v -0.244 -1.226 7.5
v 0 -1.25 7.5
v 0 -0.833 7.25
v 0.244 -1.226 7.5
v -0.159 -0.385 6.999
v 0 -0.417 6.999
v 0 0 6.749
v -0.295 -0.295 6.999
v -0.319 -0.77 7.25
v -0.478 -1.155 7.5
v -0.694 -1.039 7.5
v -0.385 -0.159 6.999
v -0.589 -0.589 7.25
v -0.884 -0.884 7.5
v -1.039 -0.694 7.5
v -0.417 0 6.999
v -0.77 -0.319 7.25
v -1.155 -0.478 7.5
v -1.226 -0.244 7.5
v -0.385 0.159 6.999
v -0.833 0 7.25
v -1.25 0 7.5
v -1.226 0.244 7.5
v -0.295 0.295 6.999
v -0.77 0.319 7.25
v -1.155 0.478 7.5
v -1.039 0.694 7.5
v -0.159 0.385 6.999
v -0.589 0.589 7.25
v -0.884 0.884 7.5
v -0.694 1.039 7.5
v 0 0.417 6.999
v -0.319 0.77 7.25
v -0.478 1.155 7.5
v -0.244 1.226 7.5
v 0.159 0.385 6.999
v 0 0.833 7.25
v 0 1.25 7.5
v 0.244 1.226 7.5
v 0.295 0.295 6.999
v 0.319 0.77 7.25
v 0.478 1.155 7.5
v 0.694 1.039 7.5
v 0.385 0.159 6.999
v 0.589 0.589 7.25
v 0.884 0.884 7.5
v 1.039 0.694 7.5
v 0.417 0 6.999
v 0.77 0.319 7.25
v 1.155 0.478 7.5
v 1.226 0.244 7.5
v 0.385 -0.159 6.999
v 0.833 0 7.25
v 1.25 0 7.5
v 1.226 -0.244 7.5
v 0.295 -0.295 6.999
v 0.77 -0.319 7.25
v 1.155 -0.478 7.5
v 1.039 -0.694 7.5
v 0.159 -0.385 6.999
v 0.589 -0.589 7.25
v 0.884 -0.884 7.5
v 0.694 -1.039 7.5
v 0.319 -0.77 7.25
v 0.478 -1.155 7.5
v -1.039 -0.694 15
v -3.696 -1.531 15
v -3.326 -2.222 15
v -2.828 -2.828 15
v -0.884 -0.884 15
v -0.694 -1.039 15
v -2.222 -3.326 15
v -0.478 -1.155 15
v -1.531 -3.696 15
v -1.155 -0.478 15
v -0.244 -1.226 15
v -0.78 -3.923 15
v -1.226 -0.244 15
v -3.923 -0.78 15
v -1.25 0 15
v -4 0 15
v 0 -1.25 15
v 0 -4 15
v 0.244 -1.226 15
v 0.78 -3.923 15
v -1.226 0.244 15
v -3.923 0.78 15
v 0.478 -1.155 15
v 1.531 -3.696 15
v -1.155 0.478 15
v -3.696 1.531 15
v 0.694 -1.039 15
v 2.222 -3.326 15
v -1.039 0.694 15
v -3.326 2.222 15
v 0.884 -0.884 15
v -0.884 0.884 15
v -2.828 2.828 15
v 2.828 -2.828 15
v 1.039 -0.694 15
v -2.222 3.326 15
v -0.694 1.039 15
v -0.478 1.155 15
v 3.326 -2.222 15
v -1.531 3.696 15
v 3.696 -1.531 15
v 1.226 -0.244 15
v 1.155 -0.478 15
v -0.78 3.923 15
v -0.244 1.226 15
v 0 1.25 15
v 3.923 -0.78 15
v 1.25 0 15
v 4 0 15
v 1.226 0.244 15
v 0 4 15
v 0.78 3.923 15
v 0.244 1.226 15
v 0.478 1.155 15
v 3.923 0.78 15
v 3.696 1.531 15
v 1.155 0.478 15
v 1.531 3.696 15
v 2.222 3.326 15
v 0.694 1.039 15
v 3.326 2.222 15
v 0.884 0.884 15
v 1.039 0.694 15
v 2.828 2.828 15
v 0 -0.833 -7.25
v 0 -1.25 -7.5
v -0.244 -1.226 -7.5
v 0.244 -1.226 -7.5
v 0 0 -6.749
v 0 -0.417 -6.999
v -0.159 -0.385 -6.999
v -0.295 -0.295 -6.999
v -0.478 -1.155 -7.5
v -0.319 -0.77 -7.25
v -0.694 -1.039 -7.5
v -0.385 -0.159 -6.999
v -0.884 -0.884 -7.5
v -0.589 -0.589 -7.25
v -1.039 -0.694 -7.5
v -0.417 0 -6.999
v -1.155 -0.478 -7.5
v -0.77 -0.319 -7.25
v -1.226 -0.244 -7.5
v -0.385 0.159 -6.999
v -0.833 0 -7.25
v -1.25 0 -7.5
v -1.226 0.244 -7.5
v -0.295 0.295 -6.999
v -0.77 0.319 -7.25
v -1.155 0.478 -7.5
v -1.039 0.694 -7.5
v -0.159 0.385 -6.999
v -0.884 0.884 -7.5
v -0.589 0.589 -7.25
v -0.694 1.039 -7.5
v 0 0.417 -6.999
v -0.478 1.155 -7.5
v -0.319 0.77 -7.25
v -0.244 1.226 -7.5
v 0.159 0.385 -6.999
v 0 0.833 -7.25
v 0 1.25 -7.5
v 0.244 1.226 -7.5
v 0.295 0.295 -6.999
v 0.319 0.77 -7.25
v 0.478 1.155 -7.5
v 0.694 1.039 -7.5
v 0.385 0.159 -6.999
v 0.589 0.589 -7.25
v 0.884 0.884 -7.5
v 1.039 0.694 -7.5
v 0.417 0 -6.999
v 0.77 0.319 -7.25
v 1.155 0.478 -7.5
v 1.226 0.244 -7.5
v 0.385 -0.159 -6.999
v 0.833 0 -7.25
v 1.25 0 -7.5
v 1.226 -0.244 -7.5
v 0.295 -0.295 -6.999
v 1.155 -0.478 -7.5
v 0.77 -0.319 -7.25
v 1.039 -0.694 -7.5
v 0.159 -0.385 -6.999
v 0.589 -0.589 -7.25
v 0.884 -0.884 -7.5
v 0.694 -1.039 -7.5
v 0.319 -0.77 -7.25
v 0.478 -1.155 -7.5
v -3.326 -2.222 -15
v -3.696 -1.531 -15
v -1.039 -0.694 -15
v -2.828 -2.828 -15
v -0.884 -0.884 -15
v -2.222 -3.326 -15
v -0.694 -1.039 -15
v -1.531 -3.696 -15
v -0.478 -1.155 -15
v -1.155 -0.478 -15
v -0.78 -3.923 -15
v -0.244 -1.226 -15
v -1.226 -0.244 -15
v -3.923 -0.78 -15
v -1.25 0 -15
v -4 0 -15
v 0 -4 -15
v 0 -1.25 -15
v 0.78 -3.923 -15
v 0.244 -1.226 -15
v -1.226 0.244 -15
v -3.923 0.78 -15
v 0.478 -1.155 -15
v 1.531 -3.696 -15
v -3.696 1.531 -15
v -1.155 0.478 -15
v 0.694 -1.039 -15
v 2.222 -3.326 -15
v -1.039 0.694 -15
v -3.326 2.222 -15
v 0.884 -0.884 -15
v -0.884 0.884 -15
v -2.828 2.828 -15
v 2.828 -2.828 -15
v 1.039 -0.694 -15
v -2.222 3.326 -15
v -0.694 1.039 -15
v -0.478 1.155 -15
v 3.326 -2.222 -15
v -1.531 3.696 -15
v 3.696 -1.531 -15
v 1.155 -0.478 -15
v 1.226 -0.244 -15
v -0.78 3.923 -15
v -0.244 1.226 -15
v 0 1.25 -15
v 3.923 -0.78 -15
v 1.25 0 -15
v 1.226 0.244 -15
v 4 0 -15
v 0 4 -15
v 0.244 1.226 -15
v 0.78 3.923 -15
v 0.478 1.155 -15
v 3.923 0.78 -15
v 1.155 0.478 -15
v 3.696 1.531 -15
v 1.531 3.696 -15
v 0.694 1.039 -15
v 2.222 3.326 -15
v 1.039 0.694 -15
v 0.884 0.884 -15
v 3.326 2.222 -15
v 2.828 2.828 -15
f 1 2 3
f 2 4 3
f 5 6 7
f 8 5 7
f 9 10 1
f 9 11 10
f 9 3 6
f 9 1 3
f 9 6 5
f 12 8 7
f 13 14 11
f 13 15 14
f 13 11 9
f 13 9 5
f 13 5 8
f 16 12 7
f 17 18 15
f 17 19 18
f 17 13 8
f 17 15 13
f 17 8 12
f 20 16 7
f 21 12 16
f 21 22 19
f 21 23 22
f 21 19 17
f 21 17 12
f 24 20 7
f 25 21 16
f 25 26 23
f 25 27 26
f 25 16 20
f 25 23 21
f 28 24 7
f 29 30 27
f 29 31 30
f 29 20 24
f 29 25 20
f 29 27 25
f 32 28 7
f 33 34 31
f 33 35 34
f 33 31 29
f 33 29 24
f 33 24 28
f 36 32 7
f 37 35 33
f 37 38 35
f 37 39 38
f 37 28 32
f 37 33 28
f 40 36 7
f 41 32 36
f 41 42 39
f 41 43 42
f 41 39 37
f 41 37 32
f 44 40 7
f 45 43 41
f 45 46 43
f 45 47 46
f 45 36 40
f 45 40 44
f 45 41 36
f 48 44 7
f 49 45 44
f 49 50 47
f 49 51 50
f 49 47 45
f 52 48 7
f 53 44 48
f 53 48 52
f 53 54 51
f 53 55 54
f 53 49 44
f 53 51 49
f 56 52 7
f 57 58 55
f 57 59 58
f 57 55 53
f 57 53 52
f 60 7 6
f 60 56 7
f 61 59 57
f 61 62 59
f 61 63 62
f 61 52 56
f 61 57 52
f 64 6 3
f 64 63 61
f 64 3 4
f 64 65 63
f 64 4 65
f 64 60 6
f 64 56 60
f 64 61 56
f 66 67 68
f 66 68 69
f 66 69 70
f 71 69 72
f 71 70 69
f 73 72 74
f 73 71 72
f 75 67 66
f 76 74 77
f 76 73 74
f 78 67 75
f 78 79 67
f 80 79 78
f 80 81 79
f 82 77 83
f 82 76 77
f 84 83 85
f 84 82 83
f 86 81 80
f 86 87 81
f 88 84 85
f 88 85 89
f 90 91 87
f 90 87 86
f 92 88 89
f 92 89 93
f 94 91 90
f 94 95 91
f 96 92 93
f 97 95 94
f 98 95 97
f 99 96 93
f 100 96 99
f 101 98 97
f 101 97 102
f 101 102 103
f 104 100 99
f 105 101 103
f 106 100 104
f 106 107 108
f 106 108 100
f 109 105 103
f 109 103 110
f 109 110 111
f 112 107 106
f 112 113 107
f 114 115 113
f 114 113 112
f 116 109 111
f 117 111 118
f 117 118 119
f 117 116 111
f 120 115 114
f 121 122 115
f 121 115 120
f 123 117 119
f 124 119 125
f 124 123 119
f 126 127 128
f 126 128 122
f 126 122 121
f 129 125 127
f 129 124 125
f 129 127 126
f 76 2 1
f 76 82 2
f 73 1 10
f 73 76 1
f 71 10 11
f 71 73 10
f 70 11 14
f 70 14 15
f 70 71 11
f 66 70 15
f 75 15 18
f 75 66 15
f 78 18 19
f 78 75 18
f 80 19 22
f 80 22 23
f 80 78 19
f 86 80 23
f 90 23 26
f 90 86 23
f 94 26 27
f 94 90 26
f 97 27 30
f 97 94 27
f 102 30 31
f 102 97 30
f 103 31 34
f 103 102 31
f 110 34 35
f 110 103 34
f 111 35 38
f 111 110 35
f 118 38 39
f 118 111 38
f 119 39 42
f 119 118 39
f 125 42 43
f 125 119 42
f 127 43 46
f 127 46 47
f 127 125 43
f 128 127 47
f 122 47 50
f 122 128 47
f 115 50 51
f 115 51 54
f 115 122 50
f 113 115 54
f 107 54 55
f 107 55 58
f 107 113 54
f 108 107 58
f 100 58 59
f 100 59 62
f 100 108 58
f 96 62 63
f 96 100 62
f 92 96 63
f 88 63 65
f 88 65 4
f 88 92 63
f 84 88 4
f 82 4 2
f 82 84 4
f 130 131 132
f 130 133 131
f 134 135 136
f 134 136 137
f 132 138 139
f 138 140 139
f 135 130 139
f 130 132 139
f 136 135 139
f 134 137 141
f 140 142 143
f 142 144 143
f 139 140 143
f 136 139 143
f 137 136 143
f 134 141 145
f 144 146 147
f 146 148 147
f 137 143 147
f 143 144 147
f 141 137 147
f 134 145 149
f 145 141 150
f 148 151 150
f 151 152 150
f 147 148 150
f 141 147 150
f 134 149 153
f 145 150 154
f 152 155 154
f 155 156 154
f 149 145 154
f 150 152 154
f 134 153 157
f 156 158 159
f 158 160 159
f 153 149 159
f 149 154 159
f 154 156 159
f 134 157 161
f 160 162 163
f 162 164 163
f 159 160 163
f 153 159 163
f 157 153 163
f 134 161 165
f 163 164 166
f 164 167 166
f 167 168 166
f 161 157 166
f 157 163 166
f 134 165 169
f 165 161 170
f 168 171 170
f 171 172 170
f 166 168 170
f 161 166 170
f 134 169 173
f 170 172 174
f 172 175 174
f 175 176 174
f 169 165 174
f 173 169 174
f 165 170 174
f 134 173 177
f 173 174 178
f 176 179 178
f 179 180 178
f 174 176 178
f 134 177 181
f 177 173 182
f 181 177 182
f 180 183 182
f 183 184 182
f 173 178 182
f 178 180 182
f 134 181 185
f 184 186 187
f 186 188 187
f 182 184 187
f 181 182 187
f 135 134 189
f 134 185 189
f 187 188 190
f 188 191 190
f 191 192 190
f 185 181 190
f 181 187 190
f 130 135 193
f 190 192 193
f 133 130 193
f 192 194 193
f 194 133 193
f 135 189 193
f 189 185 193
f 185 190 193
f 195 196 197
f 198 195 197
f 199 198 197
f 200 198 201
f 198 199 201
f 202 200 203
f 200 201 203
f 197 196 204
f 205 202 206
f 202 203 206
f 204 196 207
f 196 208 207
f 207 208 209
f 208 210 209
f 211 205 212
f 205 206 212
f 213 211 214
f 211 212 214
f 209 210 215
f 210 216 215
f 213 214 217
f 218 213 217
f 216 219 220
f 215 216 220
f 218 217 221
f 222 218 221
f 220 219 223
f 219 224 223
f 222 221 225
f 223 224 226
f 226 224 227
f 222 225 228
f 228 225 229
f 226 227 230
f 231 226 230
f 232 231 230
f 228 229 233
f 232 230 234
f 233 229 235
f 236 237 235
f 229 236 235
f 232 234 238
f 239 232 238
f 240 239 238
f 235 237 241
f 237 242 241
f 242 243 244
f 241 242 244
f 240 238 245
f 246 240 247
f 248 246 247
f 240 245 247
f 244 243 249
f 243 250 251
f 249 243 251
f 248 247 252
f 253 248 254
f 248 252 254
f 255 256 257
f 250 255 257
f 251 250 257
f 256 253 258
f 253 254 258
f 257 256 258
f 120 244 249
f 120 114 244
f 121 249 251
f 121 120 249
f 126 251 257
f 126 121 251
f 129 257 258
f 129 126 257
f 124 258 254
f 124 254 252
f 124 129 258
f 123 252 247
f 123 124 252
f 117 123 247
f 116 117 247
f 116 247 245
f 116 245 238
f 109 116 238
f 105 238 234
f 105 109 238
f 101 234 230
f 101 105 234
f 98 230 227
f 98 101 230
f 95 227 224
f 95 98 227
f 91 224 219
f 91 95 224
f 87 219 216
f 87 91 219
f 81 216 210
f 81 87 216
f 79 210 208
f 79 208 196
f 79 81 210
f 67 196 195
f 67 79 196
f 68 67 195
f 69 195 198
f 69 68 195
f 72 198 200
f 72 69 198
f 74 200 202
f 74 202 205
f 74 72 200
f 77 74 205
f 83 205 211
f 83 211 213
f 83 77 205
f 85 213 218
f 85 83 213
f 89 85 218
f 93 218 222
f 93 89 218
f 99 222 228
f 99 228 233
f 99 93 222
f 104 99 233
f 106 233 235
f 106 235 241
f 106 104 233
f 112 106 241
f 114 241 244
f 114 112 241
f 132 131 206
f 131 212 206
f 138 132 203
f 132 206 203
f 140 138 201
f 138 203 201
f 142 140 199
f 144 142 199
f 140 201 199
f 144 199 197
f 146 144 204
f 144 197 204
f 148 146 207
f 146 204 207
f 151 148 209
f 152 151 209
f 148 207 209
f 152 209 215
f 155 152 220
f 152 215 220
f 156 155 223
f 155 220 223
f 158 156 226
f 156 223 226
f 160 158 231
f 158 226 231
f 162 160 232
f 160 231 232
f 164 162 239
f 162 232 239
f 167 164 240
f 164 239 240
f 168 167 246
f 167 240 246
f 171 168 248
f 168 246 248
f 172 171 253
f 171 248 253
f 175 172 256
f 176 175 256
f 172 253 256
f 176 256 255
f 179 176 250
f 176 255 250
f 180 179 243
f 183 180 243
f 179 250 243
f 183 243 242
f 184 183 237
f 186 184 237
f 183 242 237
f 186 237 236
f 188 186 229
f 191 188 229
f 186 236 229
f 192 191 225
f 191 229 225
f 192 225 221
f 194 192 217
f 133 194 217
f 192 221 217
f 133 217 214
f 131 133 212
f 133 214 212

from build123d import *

# Parameters (mm, degrees)
SKETCH1_R           = 4
BOSS_EXTRUDE1_DEPTH = 15


with BuildPart() as part:
    # Sketch1 → Boss-Extrude1 (new, symmetric)
    with BuildSketch(Plane.XY):
        Circle(SKETCH1_R)
    extrude(amount=BOSS_EXTRUDE1_DEPTH, both=True)

    # Sketch3 → M3 Tapped Hole1 (revolve, cut)
    with BuildSketch(Plane(origin=(0, 0, 15), x_dir=(0, -1, 0), z_dir=(1, 0, 0))):
        Polygon((0, 0), (0, 8.251075774), (1.25, 7.5), (1.25, 0), align=None)
    m3_tapped_hole1 = revolve(axis=Axis((0, 0, 21.35), (0, 0, -1)), mode=Mode.SUBTRACT)

    # Mirror1: M3 Tapped Hole1 across plane
    add(m3_tapped_hole1.mirror(Plane.XY), mode=Mode.SUBTRACT)


solid = part.part
